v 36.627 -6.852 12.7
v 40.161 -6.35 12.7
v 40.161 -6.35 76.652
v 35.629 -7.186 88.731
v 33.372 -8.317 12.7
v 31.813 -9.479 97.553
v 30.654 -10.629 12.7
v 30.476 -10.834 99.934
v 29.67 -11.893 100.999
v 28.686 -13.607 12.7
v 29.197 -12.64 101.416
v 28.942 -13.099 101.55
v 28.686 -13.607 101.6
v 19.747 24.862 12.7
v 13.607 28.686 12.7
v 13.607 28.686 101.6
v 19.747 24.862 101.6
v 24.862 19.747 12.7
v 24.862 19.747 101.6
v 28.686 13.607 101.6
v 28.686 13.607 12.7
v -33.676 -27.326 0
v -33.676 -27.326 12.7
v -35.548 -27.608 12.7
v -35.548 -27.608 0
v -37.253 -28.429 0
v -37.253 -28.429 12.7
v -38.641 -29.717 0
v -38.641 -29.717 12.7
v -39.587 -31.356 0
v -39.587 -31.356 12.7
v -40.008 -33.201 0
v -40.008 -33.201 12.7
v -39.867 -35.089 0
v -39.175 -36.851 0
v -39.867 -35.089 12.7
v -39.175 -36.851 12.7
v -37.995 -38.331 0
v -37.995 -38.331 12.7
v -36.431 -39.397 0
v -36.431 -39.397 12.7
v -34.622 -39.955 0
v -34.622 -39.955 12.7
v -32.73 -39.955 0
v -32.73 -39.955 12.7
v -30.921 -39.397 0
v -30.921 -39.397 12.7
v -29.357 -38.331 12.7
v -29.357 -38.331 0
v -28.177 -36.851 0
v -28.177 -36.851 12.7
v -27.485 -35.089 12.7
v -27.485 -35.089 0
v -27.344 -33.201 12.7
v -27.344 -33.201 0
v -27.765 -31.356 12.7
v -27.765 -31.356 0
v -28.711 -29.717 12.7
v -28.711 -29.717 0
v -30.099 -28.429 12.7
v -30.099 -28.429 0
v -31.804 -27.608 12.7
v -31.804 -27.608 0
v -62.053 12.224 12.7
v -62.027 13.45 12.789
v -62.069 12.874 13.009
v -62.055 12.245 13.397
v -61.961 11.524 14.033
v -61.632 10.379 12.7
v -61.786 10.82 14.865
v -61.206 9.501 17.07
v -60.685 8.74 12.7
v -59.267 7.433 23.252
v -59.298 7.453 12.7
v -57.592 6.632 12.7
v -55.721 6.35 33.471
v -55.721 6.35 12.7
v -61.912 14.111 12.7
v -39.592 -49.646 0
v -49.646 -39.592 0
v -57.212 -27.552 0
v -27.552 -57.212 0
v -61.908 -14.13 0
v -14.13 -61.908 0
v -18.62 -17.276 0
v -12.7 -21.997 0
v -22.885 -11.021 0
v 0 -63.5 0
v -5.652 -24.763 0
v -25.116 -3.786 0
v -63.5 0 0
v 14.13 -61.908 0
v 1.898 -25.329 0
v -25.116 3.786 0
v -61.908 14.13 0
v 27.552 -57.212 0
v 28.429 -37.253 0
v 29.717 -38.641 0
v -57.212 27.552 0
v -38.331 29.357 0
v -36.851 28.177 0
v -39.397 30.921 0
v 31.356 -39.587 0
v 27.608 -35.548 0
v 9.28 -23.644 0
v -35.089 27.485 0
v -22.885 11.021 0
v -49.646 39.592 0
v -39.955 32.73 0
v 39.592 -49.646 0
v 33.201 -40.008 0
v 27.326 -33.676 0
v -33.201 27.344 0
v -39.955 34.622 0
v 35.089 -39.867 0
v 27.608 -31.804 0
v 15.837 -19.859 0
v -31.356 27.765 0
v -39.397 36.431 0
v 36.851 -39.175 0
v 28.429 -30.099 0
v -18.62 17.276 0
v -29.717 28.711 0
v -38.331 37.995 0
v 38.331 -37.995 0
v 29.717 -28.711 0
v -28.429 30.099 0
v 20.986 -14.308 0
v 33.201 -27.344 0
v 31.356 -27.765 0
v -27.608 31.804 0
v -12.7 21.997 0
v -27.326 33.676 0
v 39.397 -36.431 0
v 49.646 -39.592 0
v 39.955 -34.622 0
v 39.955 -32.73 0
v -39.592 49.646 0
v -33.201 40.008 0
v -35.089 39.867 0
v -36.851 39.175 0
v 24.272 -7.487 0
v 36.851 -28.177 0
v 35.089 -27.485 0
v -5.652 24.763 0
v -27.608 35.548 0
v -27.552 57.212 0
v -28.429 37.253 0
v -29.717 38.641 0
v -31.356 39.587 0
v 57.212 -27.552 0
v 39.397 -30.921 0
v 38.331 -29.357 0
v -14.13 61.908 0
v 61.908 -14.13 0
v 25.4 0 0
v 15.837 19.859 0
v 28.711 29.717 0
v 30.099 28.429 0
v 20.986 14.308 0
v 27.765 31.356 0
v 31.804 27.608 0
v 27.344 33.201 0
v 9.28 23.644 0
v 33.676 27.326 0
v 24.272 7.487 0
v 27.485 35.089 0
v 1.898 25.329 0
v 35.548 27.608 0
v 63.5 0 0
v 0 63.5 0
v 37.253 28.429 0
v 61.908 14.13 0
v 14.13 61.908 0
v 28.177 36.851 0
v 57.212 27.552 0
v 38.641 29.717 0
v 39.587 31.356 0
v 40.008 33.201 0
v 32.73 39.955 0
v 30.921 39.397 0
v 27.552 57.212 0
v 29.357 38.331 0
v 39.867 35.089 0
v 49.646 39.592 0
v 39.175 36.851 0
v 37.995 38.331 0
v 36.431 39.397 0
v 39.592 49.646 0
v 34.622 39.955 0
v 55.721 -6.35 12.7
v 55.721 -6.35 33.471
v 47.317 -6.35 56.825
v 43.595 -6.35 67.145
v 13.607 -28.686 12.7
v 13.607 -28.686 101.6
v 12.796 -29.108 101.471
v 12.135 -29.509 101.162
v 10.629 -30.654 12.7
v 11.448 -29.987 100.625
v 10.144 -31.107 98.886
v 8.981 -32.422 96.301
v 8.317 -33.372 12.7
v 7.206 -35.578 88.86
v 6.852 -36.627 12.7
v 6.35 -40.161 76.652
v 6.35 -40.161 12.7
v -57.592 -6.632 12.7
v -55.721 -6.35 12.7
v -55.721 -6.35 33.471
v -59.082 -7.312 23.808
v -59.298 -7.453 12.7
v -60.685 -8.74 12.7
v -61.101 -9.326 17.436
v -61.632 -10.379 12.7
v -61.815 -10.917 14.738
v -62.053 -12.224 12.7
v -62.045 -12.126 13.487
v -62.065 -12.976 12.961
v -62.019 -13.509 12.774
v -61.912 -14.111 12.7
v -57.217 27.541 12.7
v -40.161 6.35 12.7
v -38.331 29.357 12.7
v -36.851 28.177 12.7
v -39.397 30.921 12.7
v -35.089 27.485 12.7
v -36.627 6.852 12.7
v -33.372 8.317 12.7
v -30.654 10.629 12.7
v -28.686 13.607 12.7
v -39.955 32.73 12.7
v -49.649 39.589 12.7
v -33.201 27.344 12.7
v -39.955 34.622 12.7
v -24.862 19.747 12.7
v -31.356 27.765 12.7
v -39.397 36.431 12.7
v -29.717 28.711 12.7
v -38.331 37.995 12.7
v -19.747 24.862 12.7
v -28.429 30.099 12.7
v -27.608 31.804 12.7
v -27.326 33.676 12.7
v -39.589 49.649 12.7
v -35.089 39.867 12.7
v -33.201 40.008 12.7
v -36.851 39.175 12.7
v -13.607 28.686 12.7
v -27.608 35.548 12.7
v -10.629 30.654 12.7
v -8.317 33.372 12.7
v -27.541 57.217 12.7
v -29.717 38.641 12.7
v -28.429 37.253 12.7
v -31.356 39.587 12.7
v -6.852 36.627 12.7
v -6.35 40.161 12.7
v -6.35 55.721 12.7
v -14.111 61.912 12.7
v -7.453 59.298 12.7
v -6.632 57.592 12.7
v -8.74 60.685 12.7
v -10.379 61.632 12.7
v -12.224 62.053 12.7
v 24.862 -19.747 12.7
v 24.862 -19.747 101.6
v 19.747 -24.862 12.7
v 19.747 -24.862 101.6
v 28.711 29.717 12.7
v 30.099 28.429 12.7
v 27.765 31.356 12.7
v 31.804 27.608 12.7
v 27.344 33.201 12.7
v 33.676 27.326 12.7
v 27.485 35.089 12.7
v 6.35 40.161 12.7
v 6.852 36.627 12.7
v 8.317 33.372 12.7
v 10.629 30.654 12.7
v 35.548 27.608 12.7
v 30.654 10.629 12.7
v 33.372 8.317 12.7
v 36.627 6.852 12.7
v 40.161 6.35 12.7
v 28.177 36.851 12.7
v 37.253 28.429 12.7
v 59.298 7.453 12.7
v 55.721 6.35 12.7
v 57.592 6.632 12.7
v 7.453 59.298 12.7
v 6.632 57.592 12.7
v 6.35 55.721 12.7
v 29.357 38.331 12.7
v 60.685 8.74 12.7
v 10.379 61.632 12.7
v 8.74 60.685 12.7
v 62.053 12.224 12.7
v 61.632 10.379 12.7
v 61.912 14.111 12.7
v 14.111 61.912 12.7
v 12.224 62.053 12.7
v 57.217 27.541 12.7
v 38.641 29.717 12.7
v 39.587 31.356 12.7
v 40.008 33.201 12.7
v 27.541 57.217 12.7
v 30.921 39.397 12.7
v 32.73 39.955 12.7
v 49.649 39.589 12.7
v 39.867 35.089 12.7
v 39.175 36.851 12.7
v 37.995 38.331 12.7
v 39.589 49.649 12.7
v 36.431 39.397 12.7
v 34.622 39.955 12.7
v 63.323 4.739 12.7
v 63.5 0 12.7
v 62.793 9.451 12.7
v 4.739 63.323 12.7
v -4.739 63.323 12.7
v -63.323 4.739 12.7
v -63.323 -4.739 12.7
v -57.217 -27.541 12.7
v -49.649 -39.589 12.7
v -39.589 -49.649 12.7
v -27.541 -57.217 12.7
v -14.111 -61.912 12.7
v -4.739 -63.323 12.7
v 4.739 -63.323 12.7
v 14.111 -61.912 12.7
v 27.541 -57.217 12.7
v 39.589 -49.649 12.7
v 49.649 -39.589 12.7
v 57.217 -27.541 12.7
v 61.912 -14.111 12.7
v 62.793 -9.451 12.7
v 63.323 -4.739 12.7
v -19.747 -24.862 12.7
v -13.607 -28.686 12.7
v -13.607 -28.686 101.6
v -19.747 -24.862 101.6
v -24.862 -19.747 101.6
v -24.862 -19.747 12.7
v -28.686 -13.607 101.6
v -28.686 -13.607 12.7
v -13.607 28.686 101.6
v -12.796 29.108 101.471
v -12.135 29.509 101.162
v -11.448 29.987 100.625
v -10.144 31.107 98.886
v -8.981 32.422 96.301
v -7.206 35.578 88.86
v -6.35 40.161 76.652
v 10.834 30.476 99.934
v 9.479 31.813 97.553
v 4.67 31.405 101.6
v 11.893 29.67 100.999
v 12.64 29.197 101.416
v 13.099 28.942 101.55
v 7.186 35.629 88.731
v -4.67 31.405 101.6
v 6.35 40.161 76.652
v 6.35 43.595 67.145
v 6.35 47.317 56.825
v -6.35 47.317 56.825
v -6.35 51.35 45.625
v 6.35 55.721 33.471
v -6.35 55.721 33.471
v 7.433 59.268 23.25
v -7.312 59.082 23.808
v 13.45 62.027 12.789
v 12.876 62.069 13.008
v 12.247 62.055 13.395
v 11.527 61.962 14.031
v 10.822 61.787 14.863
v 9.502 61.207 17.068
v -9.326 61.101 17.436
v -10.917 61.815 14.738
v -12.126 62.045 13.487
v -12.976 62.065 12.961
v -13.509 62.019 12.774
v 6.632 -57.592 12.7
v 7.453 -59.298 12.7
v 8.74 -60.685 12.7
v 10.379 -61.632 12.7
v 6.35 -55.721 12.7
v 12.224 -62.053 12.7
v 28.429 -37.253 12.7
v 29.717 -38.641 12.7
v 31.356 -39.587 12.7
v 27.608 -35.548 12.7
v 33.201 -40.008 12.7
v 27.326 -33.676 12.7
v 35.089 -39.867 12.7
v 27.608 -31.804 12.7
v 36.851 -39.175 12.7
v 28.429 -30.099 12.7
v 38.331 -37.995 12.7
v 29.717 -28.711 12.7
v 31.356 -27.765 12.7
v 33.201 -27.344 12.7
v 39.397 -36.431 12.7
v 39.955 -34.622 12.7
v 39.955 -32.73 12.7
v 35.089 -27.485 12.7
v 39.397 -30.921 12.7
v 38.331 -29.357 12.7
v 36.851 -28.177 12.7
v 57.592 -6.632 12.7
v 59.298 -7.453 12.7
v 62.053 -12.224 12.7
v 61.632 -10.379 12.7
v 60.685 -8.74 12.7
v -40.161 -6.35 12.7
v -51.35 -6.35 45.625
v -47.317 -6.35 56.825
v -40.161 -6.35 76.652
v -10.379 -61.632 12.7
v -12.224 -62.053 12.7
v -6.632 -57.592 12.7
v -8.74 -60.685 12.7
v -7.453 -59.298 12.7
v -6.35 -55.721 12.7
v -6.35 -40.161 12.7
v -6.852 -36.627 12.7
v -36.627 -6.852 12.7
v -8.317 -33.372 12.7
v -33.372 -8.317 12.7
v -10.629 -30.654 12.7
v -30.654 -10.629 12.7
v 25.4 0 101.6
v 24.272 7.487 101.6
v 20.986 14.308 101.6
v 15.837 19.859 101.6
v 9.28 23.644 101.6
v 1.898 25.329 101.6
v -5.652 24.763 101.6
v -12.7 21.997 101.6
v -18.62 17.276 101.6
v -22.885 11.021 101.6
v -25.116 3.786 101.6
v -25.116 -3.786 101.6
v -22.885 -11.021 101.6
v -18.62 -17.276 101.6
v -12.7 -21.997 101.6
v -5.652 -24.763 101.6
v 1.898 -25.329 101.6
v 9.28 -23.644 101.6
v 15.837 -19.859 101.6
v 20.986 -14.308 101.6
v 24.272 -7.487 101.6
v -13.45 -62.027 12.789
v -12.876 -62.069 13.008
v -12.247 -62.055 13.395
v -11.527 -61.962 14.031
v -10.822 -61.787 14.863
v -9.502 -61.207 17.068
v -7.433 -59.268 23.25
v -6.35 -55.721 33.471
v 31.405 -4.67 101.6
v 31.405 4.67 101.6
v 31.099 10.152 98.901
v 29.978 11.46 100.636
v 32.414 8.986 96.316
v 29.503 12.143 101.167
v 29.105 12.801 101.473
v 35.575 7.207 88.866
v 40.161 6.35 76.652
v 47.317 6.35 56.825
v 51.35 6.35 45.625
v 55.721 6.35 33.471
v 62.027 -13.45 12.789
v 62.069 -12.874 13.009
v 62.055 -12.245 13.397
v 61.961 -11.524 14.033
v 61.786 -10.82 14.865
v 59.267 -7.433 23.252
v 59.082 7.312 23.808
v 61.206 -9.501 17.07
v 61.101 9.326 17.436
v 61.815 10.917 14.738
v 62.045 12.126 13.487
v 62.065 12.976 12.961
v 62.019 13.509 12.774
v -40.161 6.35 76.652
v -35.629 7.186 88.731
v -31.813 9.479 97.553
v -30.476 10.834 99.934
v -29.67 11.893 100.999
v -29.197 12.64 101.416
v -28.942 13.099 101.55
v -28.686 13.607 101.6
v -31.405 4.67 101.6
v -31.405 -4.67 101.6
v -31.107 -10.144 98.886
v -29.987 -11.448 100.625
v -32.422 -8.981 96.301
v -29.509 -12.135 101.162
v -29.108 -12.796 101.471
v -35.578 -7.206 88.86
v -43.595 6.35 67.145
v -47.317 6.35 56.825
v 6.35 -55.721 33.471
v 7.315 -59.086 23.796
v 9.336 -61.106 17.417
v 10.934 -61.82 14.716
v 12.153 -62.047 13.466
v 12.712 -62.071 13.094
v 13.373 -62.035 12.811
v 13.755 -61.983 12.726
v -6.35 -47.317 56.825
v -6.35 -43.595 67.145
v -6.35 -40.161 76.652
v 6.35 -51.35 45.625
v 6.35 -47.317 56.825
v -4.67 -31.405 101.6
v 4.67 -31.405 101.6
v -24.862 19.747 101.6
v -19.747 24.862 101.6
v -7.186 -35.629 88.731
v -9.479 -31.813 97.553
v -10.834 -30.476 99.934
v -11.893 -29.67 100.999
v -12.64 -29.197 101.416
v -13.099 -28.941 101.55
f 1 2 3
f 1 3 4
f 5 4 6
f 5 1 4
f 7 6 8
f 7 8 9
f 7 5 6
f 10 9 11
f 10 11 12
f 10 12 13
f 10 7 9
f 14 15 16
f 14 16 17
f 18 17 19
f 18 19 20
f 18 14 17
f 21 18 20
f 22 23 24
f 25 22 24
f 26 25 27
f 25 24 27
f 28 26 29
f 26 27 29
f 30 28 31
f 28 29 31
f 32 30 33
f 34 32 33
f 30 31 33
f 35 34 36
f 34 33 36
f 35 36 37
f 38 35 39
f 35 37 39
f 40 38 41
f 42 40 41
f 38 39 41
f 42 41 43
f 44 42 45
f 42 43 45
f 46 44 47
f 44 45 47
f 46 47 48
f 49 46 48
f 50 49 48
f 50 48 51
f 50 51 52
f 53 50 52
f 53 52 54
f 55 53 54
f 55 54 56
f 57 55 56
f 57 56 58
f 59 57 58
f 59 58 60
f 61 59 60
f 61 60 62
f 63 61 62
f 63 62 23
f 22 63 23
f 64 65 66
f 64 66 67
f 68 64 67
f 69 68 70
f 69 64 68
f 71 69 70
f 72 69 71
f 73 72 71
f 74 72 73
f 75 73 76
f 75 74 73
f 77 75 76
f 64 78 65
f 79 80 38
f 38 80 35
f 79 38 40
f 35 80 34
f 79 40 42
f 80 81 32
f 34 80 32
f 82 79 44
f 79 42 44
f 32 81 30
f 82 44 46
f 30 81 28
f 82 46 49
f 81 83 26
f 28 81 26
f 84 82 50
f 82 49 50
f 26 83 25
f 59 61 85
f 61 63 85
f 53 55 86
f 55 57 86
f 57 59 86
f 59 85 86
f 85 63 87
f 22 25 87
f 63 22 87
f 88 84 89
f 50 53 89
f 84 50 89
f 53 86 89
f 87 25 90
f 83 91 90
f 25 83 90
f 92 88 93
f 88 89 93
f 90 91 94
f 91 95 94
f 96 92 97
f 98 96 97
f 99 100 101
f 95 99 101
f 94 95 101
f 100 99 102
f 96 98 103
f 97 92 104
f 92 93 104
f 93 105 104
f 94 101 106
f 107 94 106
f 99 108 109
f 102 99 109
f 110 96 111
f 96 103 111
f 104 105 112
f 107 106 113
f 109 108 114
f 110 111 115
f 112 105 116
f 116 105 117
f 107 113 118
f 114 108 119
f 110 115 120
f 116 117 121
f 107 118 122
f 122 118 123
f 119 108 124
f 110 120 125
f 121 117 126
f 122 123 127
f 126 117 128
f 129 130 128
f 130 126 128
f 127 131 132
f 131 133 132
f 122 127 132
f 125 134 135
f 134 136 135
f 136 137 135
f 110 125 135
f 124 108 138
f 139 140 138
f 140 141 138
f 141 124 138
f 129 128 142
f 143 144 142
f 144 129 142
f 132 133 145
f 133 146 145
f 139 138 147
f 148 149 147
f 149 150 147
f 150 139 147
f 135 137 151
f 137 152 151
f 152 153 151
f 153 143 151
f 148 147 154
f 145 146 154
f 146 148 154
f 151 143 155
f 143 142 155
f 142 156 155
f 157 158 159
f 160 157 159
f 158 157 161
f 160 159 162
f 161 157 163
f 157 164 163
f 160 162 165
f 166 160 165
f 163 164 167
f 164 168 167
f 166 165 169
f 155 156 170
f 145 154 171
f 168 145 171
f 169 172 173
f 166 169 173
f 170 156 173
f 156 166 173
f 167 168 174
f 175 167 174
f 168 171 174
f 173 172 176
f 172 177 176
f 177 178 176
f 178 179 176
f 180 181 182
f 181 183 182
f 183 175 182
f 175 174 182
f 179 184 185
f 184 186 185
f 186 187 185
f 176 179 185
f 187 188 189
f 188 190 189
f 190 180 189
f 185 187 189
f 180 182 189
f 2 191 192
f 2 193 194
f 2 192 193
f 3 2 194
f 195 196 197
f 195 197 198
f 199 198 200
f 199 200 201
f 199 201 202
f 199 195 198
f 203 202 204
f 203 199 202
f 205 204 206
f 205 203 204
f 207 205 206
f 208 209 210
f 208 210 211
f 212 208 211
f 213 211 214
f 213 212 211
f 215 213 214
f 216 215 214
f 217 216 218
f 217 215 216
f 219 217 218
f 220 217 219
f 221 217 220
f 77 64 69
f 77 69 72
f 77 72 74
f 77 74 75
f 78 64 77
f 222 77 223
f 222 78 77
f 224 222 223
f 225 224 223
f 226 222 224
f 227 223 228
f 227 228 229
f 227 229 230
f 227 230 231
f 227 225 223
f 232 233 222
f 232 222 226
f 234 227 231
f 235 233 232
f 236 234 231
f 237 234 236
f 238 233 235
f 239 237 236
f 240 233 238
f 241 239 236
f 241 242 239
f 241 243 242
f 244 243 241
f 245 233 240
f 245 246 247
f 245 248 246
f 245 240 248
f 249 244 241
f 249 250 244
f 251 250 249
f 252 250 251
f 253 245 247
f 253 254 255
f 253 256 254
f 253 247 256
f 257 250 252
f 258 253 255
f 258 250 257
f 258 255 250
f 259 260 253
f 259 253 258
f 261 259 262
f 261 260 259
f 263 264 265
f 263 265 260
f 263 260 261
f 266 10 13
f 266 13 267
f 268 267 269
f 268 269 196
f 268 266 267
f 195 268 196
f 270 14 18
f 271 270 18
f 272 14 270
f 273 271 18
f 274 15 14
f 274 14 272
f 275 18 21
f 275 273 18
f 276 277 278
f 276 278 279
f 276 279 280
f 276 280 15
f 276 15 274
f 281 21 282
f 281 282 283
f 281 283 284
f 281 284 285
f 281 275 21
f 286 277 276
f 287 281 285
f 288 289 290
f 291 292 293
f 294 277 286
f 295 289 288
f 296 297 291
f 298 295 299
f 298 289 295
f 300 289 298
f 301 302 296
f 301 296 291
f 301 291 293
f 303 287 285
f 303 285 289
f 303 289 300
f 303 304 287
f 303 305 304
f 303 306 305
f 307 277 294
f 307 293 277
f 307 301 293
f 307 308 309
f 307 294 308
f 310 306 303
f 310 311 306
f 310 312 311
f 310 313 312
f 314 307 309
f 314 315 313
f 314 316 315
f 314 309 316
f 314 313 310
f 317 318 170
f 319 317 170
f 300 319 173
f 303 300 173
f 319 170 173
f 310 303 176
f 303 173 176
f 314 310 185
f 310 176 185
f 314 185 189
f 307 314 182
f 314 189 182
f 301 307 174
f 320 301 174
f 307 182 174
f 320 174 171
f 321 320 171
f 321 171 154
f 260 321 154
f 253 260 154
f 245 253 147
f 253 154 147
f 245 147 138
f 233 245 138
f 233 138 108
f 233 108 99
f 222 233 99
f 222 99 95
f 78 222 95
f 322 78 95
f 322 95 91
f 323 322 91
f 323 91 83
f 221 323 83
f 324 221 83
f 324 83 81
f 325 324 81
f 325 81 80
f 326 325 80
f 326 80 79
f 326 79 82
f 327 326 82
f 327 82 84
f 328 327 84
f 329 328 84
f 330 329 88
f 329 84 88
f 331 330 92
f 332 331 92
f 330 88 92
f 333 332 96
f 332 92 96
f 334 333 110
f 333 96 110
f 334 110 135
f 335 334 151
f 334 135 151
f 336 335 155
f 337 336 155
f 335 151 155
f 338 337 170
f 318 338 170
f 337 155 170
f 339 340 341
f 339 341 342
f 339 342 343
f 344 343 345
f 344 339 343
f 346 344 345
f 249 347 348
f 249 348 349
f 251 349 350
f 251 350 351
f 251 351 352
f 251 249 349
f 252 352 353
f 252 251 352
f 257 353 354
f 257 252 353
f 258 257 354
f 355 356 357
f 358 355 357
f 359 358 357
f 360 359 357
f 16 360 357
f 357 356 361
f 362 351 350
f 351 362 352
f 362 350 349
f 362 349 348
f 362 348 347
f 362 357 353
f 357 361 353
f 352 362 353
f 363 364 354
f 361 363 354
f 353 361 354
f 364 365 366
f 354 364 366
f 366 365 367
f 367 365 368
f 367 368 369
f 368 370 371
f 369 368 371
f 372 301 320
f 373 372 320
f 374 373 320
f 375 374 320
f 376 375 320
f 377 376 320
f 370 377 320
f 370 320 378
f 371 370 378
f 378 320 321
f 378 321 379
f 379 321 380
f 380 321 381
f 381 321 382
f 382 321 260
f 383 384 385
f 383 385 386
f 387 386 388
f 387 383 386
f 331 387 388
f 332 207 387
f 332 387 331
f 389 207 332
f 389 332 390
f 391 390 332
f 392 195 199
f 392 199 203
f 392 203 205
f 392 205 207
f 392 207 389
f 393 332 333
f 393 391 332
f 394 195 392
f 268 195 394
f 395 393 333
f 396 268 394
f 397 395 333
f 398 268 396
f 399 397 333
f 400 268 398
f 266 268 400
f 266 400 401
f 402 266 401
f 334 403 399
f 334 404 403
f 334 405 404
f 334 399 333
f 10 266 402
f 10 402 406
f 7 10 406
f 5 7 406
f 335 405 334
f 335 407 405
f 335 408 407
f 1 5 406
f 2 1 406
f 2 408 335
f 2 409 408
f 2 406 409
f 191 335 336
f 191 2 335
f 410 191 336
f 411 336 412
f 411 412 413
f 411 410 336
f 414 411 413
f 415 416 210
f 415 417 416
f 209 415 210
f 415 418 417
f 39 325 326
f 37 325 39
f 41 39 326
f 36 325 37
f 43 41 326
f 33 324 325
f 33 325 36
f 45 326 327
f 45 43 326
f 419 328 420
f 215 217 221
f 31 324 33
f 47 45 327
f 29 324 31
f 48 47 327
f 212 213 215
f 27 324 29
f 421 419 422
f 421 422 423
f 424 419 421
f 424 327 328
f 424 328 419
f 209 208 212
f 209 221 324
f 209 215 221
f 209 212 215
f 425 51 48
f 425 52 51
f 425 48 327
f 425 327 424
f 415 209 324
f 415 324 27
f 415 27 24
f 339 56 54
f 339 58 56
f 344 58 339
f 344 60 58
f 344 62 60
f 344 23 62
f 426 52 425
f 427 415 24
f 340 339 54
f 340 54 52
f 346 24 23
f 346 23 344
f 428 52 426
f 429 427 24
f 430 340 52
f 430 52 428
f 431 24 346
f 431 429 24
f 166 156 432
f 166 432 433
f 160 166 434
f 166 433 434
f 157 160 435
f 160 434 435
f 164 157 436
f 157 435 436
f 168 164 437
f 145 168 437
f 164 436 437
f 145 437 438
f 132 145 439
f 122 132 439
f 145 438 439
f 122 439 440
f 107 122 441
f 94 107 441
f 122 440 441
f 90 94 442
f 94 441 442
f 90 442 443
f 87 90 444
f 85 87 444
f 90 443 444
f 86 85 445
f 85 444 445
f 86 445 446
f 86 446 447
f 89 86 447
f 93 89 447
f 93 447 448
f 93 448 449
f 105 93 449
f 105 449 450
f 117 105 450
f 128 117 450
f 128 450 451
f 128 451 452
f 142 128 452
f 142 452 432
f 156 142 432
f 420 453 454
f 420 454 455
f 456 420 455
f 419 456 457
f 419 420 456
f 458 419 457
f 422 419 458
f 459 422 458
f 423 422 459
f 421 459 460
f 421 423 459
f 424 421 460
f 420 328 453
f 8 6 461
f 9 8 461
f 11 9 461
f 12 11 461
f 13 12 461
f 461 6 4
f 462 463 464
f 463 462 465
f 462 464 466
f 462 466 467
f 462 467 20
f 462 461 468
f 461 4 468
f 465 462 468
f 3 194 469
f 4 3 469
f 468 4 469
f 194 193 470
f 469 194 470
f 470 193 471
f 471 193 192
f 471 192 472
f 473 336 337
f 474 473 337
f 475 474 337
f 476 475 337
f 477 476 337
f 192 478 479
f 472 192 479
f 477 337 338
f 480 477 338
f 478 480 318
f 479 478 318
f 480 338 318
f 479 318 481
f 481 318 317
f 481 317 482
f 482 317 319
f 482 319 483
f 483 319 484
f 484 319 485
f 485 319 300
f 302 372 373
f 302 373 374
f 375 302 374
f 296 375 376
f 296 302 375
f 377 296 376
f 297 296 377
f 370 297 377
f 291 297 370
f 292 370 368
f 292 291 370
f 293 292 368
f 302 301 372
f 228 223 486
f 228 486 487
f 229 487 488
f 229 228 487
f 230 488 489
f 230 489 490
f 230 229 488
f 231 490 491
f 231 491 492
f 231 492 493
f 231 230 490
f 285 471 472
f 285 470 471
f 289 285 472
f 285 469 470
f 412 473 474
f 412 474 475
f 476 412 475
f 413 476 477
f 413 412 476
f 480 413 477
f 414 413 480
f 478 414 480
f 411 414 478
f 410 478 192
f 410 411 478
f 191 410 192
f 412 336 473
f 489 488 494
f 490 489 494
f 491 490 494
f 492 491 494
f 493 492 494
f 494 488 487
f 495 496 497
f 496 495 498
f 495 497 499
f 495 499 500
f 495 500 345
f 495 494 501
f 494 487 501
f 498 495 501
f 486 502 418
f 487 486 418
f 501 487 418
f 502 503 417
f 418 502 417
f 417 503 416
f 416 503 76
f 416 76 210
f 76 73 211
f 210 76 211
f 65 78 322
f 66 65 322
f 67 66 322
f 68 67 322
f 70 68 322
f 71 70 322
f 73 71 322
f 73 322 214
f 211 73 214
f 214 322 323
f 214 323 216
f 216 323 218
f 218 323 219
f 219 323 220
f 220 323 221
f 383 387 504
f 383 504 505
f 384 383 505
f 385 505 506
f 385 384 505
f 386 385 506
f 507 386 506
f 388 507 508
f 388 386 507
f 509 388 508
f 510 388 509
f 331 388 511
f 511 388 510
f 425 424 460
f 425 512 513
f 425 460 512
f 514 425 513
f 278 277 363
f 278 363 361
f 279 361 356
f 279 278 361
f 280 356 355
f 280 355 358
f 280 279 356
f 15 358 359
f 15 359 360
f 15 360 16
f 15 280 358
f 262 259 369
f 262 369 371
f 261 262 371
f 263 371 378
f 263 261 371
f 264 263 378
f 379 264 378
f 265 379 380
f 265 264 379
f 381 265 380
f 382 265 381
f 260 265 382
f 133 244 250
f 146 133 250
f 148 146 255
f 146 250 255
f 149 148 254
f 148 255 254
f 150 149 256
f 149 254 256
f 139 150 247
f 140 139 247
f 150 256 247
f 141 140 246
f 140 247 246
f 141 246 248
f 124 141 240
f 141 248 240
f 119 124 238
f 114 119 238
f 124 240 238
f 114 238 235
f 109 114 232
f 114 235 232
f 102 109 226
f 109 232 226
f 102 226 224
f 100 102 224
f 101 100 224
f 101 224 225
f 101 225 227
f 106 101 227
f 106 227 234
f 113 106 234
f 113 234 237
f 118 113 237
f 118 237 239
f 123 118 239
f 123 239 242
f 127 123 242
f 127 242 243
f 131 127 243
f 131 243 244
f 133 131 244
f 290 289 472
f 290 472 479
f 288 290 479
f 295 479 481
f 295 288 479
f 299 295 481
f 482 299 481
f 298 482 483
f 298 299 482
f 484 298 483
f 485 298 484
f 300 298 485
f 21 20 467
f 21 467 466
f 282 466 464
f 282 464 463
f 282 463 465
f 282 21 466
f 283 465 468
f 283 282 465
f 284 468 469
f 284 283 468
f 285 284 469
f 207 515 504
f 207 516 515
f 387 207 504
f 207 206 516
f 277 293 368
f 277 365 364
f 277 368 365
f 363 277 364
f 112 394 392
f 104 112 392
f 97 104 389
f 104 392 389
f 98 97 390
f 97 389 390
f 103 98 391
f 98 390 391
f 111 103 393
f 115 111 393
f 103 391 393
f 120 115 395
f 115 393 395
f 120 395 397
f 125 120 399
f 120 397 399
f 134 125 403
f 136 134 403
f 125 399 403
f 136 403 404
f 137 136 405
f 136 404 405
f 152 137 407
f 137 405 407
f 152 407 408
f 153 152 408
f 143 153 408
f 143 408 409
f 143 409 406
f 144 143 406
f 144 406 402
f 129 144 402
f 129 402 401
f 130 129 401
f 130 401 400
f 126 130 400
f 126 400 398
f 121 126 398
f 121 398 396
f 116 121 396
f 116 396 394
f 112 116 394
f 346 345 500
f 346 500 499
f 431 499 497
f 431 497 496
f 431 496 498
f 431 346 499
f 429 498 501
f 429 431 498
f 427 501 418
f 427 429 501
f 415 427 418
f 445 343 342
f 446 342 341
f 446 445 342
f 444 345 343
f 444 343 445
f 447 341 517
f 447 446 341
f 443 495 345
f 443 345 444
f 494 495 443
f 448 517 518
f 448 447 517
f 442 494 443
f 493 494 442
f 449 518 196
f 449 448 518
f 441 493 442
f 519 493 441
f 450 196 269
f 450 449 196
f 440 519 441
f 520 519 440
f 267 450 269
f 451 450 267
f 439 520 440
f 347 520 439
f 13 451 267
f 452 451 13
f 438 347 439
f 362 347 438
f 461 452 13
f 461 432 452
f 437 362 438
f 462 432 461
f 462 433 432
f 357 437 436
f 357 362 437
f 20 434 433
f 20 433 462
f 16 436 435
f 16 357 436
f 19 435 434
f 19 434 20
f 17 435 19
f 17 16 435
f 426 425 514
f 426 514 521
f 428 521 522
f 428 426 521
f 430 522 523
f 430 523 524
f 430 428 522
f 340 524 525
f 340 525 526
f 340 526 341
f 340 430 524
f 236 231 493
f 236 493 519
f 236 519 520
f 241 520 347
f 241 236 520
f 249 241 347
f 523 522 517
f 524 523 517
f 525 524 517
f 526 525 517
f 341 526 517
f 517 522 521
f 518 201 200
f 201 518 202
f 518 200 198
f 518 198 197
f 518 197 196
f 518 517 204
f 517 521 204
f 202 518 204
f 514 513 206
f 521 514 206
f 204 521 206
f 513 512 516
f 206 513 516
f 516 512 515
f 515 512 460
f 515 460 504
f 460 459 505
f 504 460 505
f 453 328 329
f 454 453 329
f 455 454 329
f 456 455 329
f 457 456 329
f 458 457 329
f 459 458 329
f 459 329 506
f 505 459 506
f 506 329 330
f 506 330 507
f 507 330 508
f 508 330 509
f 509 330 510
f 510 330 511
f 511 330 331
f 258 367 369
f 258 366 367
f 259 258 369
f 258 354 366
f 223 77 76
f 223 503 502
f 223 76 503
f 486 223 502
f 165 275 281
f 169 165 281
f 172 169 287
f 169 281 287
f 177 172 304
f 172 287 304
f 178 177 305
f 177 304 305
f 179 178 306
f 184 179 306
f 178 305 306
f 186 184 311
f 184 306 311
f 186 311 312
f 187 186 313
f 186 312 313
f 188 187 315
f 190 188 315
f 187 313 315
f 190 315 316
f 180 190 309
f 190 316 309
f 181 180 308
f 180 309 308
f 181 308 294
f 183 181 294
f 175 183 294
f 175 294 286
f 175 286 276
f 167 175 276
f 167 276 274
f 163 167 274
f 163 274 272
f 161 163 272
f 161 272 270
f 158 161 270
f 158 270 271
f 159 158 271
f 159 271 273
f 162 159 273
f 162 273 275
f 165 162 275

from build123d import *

# Parameters (mm, degrees)
F0_R            = 63.5
F1_DEPTH        = 12.7
F2_R            = 31.75
F3_DEPTH        = 88.9
F7_DEPTH        = 88.9010001
F8_R            = 6.35
F9_DEPTH        = 12.701
F9_COPIES_COUNT = 4
F10_R           = 25.4
F11_DEPTH       = 101.601


# Not quite as in the source:
# - a pattern or mirror of a feature is missing from the dataset's text; its kind, count and spacing are read off the source's solid


with BuildPart() as f1:
    # F0 (on Top) → F1 (new body)
    with BuildSketch(Plane.XY):
        Circle(F0_R)
    extrude(amount=F1_DEPTH)

    # F2 (on face) → F3 (join)
    with BuildSketch(Plane.XY.offset(12.7)):
        Circle(F2_R)
    extrude(amount=F3_DEPTH)

    # F4 (on Right) → F5 (revolve)
    with BuildSketch(Plane.YZ):
        Polygon((-31.75, 12.7), (-31.75, 101.6), (-63.5, 12.7), align=None)
    revolve(axis=Axis((0, 0, 73.5445022583), (0, 0, 1)))

    # F6 (on face) → F7 (cut, through all)
    with BuildSketch(Plane.XY.offset(12.7)):
        with BuildLine():
            ThreePointArc((-14.1111111111, 61.9122487333), (-44.9012806053, 44.9012806053), (-61.9122487333, 14.1111111111))
            ThreePointArc((-61.9122487333, 14.1111111111), (-60.6850472058, 8.7400792657), (-55.7210238599, 6.35))
            Line((-55.7210238599, 6.35), (-40.1609262841, 6.35))
            ThreePointArc((-40.1609262841, 6.35), (-33.3724907396, 8.3165409649), (-28.6863759172, 13.6071428571))
            ThreePointArc((-28.6863759172, 13.6071428571), (-22.4506403027, 22.4506403027), (-13.6071428571, 28.6863759172))
            ThreePointArc((-13.6071428571, 28.6863759172), (-8.3165409649, 33.3724907396), (-6.35, 40.1609262841))
            Line((-6.35, 40.1609262841), (-6.35, 55.7210238599))
            ThreePointArc((-6.35, 55.7210238599), (-8.7400792657, 60.6850472058), (-14.1111111111, 61.9122487333))
        make_face()
        with BuildLine():
            Line((-40.1609262841, -6.35), (-55.7210238599, -6.35))
            ThreePointArc((-55.7210238599, -6.35), (-60.6850472058, -8.7400792657), (-61.9122487333, -14.1111111111))
            ThreePointArc((-61.9122487333, -14.1111111111), (-44.9012806053, -44.9012806053), (-14.1111111111, -61.9122487333))
            ThreePointArc((-14.1111111111, -61.9122487333), (-8.7400792657, -60.6850472058), (-6.35, -55.7210238599))
            Line((-6.35, -55.7210238599), (-6.35, -40.1609262841))
            ThreePointArc((-6.35, -40.1609262841), (-8.3165409649, -33.3724907396), (-13.6071428571, -28.6863759172))
            ThreePointArc((-13.6071428571, -28.6863759172), (-22.4506403027, -22.4506403027), (-28.6863759172, -13.6071428571))
            ThreePointArc((-28.6863759172, -13.6071428571), (-33.3724907396, -8.3165409649), (-40.1609262841, -6.35))
        make_face()
        with BuildLine():
            Line((6.35, -40.1609262841), (6.35, -55.7210238599))
            ThreePointArc((6.35, -55.7210238599), (8.7400792657, -60.6850472058), (14.1111111111, -61.9122487333))
            ThreePointArc((14.1111111111, -61.9122487333), (44.9012806053, -44.9012806053), (61.9122487333, -14.1111111111))
            ThreePointArc((61.9122487333, -14.1111111111), (60.6850472058, -8.7400792657), (55.7210238599, -6.35))
            Line((55.7210238599, -6.35), (40.1609262841, -6.35))
            ThreePointArc((40.1609262841, -6.35), (33.3724907396, -8.3165409649), (28.6863759172, -13.6071428571))
            ThreePointArc((28.6863759172, -13.6071428571), (22.4506403027, -22.4506403027), (13.6071428571, -28.6863759172))
            ThreePointArc((13.6071428571, -28.6863759172), (8.3165409649, -33.3724907396), (6.35, -40.1609262841))
        make_face()
        with BuildLine():
            Line((40.1609262841, 6.35), (55.7210238599, 6.35))
            ThreePointArc((55.7210238599, 6.35), (60.6850472058, 8.7400792657), (61.9122487333, 14.1111111111))
            ThreePointArc((61.9122487333, 14.1111111111), (44.9012806053, 44.9012806053), (14.1111111111, 61.9122487333))
            ThreePointArc((14.1111111111, 61.9122487333), (8.7400792657, 60.6850472058), (6.35, 55.7210238599))
            Line((6.35, 55.7210238599), (6.35, 40.1609262841))
            ThreePointArc((6.35, 40.1609262841), (8.3165409649, 33.3724907396), (13.6071428571, 28.6863759172))
            ThreePointArc((13.6071428571, 28.6863759172), (22.4506403027, 22.4506403027), (28.6863759172, 13.6071428571))
            ThreePointArc((28.6863759172, 13.6071428571), (33.3724907396, 8.3165409649), (40.1609262841, 6.35))
        make_face()
    extrude(amount=F7_DEPTH, mode=Mode.SUBTRACT)

    # F8 (on face) → F9 (cut, through all)
    with BuildSketch(Plane.XY.offset(12.7)):
        with Locations((-33.675960454, 33.675960454)):
            Circle(F8_R)
    f9 = extrude(amount=-F9_DEPTH, mode=Mode.SUBTRACT)

    # F9_copies: F9 ×4 about axis
    f9_copies_axis = Axis((0, 0, 0), (0, 0, 1))
    for i in range(1, F9_COPIES_COUNT):
        add(f9.rotate(f9_copies_axis, i * 360 / F9_COPIES_COUNT), mode=Mode.SUBTRACT)

    # F10 (on face) → F11 (cut, through all)
    with BuildSketch(Plane.XY.offset(101.6)):
        Circle(F10_R)
    extrude(amount=-F11_DEPTH, mode=Mode.SUBTRACT)


solid = f1.part
